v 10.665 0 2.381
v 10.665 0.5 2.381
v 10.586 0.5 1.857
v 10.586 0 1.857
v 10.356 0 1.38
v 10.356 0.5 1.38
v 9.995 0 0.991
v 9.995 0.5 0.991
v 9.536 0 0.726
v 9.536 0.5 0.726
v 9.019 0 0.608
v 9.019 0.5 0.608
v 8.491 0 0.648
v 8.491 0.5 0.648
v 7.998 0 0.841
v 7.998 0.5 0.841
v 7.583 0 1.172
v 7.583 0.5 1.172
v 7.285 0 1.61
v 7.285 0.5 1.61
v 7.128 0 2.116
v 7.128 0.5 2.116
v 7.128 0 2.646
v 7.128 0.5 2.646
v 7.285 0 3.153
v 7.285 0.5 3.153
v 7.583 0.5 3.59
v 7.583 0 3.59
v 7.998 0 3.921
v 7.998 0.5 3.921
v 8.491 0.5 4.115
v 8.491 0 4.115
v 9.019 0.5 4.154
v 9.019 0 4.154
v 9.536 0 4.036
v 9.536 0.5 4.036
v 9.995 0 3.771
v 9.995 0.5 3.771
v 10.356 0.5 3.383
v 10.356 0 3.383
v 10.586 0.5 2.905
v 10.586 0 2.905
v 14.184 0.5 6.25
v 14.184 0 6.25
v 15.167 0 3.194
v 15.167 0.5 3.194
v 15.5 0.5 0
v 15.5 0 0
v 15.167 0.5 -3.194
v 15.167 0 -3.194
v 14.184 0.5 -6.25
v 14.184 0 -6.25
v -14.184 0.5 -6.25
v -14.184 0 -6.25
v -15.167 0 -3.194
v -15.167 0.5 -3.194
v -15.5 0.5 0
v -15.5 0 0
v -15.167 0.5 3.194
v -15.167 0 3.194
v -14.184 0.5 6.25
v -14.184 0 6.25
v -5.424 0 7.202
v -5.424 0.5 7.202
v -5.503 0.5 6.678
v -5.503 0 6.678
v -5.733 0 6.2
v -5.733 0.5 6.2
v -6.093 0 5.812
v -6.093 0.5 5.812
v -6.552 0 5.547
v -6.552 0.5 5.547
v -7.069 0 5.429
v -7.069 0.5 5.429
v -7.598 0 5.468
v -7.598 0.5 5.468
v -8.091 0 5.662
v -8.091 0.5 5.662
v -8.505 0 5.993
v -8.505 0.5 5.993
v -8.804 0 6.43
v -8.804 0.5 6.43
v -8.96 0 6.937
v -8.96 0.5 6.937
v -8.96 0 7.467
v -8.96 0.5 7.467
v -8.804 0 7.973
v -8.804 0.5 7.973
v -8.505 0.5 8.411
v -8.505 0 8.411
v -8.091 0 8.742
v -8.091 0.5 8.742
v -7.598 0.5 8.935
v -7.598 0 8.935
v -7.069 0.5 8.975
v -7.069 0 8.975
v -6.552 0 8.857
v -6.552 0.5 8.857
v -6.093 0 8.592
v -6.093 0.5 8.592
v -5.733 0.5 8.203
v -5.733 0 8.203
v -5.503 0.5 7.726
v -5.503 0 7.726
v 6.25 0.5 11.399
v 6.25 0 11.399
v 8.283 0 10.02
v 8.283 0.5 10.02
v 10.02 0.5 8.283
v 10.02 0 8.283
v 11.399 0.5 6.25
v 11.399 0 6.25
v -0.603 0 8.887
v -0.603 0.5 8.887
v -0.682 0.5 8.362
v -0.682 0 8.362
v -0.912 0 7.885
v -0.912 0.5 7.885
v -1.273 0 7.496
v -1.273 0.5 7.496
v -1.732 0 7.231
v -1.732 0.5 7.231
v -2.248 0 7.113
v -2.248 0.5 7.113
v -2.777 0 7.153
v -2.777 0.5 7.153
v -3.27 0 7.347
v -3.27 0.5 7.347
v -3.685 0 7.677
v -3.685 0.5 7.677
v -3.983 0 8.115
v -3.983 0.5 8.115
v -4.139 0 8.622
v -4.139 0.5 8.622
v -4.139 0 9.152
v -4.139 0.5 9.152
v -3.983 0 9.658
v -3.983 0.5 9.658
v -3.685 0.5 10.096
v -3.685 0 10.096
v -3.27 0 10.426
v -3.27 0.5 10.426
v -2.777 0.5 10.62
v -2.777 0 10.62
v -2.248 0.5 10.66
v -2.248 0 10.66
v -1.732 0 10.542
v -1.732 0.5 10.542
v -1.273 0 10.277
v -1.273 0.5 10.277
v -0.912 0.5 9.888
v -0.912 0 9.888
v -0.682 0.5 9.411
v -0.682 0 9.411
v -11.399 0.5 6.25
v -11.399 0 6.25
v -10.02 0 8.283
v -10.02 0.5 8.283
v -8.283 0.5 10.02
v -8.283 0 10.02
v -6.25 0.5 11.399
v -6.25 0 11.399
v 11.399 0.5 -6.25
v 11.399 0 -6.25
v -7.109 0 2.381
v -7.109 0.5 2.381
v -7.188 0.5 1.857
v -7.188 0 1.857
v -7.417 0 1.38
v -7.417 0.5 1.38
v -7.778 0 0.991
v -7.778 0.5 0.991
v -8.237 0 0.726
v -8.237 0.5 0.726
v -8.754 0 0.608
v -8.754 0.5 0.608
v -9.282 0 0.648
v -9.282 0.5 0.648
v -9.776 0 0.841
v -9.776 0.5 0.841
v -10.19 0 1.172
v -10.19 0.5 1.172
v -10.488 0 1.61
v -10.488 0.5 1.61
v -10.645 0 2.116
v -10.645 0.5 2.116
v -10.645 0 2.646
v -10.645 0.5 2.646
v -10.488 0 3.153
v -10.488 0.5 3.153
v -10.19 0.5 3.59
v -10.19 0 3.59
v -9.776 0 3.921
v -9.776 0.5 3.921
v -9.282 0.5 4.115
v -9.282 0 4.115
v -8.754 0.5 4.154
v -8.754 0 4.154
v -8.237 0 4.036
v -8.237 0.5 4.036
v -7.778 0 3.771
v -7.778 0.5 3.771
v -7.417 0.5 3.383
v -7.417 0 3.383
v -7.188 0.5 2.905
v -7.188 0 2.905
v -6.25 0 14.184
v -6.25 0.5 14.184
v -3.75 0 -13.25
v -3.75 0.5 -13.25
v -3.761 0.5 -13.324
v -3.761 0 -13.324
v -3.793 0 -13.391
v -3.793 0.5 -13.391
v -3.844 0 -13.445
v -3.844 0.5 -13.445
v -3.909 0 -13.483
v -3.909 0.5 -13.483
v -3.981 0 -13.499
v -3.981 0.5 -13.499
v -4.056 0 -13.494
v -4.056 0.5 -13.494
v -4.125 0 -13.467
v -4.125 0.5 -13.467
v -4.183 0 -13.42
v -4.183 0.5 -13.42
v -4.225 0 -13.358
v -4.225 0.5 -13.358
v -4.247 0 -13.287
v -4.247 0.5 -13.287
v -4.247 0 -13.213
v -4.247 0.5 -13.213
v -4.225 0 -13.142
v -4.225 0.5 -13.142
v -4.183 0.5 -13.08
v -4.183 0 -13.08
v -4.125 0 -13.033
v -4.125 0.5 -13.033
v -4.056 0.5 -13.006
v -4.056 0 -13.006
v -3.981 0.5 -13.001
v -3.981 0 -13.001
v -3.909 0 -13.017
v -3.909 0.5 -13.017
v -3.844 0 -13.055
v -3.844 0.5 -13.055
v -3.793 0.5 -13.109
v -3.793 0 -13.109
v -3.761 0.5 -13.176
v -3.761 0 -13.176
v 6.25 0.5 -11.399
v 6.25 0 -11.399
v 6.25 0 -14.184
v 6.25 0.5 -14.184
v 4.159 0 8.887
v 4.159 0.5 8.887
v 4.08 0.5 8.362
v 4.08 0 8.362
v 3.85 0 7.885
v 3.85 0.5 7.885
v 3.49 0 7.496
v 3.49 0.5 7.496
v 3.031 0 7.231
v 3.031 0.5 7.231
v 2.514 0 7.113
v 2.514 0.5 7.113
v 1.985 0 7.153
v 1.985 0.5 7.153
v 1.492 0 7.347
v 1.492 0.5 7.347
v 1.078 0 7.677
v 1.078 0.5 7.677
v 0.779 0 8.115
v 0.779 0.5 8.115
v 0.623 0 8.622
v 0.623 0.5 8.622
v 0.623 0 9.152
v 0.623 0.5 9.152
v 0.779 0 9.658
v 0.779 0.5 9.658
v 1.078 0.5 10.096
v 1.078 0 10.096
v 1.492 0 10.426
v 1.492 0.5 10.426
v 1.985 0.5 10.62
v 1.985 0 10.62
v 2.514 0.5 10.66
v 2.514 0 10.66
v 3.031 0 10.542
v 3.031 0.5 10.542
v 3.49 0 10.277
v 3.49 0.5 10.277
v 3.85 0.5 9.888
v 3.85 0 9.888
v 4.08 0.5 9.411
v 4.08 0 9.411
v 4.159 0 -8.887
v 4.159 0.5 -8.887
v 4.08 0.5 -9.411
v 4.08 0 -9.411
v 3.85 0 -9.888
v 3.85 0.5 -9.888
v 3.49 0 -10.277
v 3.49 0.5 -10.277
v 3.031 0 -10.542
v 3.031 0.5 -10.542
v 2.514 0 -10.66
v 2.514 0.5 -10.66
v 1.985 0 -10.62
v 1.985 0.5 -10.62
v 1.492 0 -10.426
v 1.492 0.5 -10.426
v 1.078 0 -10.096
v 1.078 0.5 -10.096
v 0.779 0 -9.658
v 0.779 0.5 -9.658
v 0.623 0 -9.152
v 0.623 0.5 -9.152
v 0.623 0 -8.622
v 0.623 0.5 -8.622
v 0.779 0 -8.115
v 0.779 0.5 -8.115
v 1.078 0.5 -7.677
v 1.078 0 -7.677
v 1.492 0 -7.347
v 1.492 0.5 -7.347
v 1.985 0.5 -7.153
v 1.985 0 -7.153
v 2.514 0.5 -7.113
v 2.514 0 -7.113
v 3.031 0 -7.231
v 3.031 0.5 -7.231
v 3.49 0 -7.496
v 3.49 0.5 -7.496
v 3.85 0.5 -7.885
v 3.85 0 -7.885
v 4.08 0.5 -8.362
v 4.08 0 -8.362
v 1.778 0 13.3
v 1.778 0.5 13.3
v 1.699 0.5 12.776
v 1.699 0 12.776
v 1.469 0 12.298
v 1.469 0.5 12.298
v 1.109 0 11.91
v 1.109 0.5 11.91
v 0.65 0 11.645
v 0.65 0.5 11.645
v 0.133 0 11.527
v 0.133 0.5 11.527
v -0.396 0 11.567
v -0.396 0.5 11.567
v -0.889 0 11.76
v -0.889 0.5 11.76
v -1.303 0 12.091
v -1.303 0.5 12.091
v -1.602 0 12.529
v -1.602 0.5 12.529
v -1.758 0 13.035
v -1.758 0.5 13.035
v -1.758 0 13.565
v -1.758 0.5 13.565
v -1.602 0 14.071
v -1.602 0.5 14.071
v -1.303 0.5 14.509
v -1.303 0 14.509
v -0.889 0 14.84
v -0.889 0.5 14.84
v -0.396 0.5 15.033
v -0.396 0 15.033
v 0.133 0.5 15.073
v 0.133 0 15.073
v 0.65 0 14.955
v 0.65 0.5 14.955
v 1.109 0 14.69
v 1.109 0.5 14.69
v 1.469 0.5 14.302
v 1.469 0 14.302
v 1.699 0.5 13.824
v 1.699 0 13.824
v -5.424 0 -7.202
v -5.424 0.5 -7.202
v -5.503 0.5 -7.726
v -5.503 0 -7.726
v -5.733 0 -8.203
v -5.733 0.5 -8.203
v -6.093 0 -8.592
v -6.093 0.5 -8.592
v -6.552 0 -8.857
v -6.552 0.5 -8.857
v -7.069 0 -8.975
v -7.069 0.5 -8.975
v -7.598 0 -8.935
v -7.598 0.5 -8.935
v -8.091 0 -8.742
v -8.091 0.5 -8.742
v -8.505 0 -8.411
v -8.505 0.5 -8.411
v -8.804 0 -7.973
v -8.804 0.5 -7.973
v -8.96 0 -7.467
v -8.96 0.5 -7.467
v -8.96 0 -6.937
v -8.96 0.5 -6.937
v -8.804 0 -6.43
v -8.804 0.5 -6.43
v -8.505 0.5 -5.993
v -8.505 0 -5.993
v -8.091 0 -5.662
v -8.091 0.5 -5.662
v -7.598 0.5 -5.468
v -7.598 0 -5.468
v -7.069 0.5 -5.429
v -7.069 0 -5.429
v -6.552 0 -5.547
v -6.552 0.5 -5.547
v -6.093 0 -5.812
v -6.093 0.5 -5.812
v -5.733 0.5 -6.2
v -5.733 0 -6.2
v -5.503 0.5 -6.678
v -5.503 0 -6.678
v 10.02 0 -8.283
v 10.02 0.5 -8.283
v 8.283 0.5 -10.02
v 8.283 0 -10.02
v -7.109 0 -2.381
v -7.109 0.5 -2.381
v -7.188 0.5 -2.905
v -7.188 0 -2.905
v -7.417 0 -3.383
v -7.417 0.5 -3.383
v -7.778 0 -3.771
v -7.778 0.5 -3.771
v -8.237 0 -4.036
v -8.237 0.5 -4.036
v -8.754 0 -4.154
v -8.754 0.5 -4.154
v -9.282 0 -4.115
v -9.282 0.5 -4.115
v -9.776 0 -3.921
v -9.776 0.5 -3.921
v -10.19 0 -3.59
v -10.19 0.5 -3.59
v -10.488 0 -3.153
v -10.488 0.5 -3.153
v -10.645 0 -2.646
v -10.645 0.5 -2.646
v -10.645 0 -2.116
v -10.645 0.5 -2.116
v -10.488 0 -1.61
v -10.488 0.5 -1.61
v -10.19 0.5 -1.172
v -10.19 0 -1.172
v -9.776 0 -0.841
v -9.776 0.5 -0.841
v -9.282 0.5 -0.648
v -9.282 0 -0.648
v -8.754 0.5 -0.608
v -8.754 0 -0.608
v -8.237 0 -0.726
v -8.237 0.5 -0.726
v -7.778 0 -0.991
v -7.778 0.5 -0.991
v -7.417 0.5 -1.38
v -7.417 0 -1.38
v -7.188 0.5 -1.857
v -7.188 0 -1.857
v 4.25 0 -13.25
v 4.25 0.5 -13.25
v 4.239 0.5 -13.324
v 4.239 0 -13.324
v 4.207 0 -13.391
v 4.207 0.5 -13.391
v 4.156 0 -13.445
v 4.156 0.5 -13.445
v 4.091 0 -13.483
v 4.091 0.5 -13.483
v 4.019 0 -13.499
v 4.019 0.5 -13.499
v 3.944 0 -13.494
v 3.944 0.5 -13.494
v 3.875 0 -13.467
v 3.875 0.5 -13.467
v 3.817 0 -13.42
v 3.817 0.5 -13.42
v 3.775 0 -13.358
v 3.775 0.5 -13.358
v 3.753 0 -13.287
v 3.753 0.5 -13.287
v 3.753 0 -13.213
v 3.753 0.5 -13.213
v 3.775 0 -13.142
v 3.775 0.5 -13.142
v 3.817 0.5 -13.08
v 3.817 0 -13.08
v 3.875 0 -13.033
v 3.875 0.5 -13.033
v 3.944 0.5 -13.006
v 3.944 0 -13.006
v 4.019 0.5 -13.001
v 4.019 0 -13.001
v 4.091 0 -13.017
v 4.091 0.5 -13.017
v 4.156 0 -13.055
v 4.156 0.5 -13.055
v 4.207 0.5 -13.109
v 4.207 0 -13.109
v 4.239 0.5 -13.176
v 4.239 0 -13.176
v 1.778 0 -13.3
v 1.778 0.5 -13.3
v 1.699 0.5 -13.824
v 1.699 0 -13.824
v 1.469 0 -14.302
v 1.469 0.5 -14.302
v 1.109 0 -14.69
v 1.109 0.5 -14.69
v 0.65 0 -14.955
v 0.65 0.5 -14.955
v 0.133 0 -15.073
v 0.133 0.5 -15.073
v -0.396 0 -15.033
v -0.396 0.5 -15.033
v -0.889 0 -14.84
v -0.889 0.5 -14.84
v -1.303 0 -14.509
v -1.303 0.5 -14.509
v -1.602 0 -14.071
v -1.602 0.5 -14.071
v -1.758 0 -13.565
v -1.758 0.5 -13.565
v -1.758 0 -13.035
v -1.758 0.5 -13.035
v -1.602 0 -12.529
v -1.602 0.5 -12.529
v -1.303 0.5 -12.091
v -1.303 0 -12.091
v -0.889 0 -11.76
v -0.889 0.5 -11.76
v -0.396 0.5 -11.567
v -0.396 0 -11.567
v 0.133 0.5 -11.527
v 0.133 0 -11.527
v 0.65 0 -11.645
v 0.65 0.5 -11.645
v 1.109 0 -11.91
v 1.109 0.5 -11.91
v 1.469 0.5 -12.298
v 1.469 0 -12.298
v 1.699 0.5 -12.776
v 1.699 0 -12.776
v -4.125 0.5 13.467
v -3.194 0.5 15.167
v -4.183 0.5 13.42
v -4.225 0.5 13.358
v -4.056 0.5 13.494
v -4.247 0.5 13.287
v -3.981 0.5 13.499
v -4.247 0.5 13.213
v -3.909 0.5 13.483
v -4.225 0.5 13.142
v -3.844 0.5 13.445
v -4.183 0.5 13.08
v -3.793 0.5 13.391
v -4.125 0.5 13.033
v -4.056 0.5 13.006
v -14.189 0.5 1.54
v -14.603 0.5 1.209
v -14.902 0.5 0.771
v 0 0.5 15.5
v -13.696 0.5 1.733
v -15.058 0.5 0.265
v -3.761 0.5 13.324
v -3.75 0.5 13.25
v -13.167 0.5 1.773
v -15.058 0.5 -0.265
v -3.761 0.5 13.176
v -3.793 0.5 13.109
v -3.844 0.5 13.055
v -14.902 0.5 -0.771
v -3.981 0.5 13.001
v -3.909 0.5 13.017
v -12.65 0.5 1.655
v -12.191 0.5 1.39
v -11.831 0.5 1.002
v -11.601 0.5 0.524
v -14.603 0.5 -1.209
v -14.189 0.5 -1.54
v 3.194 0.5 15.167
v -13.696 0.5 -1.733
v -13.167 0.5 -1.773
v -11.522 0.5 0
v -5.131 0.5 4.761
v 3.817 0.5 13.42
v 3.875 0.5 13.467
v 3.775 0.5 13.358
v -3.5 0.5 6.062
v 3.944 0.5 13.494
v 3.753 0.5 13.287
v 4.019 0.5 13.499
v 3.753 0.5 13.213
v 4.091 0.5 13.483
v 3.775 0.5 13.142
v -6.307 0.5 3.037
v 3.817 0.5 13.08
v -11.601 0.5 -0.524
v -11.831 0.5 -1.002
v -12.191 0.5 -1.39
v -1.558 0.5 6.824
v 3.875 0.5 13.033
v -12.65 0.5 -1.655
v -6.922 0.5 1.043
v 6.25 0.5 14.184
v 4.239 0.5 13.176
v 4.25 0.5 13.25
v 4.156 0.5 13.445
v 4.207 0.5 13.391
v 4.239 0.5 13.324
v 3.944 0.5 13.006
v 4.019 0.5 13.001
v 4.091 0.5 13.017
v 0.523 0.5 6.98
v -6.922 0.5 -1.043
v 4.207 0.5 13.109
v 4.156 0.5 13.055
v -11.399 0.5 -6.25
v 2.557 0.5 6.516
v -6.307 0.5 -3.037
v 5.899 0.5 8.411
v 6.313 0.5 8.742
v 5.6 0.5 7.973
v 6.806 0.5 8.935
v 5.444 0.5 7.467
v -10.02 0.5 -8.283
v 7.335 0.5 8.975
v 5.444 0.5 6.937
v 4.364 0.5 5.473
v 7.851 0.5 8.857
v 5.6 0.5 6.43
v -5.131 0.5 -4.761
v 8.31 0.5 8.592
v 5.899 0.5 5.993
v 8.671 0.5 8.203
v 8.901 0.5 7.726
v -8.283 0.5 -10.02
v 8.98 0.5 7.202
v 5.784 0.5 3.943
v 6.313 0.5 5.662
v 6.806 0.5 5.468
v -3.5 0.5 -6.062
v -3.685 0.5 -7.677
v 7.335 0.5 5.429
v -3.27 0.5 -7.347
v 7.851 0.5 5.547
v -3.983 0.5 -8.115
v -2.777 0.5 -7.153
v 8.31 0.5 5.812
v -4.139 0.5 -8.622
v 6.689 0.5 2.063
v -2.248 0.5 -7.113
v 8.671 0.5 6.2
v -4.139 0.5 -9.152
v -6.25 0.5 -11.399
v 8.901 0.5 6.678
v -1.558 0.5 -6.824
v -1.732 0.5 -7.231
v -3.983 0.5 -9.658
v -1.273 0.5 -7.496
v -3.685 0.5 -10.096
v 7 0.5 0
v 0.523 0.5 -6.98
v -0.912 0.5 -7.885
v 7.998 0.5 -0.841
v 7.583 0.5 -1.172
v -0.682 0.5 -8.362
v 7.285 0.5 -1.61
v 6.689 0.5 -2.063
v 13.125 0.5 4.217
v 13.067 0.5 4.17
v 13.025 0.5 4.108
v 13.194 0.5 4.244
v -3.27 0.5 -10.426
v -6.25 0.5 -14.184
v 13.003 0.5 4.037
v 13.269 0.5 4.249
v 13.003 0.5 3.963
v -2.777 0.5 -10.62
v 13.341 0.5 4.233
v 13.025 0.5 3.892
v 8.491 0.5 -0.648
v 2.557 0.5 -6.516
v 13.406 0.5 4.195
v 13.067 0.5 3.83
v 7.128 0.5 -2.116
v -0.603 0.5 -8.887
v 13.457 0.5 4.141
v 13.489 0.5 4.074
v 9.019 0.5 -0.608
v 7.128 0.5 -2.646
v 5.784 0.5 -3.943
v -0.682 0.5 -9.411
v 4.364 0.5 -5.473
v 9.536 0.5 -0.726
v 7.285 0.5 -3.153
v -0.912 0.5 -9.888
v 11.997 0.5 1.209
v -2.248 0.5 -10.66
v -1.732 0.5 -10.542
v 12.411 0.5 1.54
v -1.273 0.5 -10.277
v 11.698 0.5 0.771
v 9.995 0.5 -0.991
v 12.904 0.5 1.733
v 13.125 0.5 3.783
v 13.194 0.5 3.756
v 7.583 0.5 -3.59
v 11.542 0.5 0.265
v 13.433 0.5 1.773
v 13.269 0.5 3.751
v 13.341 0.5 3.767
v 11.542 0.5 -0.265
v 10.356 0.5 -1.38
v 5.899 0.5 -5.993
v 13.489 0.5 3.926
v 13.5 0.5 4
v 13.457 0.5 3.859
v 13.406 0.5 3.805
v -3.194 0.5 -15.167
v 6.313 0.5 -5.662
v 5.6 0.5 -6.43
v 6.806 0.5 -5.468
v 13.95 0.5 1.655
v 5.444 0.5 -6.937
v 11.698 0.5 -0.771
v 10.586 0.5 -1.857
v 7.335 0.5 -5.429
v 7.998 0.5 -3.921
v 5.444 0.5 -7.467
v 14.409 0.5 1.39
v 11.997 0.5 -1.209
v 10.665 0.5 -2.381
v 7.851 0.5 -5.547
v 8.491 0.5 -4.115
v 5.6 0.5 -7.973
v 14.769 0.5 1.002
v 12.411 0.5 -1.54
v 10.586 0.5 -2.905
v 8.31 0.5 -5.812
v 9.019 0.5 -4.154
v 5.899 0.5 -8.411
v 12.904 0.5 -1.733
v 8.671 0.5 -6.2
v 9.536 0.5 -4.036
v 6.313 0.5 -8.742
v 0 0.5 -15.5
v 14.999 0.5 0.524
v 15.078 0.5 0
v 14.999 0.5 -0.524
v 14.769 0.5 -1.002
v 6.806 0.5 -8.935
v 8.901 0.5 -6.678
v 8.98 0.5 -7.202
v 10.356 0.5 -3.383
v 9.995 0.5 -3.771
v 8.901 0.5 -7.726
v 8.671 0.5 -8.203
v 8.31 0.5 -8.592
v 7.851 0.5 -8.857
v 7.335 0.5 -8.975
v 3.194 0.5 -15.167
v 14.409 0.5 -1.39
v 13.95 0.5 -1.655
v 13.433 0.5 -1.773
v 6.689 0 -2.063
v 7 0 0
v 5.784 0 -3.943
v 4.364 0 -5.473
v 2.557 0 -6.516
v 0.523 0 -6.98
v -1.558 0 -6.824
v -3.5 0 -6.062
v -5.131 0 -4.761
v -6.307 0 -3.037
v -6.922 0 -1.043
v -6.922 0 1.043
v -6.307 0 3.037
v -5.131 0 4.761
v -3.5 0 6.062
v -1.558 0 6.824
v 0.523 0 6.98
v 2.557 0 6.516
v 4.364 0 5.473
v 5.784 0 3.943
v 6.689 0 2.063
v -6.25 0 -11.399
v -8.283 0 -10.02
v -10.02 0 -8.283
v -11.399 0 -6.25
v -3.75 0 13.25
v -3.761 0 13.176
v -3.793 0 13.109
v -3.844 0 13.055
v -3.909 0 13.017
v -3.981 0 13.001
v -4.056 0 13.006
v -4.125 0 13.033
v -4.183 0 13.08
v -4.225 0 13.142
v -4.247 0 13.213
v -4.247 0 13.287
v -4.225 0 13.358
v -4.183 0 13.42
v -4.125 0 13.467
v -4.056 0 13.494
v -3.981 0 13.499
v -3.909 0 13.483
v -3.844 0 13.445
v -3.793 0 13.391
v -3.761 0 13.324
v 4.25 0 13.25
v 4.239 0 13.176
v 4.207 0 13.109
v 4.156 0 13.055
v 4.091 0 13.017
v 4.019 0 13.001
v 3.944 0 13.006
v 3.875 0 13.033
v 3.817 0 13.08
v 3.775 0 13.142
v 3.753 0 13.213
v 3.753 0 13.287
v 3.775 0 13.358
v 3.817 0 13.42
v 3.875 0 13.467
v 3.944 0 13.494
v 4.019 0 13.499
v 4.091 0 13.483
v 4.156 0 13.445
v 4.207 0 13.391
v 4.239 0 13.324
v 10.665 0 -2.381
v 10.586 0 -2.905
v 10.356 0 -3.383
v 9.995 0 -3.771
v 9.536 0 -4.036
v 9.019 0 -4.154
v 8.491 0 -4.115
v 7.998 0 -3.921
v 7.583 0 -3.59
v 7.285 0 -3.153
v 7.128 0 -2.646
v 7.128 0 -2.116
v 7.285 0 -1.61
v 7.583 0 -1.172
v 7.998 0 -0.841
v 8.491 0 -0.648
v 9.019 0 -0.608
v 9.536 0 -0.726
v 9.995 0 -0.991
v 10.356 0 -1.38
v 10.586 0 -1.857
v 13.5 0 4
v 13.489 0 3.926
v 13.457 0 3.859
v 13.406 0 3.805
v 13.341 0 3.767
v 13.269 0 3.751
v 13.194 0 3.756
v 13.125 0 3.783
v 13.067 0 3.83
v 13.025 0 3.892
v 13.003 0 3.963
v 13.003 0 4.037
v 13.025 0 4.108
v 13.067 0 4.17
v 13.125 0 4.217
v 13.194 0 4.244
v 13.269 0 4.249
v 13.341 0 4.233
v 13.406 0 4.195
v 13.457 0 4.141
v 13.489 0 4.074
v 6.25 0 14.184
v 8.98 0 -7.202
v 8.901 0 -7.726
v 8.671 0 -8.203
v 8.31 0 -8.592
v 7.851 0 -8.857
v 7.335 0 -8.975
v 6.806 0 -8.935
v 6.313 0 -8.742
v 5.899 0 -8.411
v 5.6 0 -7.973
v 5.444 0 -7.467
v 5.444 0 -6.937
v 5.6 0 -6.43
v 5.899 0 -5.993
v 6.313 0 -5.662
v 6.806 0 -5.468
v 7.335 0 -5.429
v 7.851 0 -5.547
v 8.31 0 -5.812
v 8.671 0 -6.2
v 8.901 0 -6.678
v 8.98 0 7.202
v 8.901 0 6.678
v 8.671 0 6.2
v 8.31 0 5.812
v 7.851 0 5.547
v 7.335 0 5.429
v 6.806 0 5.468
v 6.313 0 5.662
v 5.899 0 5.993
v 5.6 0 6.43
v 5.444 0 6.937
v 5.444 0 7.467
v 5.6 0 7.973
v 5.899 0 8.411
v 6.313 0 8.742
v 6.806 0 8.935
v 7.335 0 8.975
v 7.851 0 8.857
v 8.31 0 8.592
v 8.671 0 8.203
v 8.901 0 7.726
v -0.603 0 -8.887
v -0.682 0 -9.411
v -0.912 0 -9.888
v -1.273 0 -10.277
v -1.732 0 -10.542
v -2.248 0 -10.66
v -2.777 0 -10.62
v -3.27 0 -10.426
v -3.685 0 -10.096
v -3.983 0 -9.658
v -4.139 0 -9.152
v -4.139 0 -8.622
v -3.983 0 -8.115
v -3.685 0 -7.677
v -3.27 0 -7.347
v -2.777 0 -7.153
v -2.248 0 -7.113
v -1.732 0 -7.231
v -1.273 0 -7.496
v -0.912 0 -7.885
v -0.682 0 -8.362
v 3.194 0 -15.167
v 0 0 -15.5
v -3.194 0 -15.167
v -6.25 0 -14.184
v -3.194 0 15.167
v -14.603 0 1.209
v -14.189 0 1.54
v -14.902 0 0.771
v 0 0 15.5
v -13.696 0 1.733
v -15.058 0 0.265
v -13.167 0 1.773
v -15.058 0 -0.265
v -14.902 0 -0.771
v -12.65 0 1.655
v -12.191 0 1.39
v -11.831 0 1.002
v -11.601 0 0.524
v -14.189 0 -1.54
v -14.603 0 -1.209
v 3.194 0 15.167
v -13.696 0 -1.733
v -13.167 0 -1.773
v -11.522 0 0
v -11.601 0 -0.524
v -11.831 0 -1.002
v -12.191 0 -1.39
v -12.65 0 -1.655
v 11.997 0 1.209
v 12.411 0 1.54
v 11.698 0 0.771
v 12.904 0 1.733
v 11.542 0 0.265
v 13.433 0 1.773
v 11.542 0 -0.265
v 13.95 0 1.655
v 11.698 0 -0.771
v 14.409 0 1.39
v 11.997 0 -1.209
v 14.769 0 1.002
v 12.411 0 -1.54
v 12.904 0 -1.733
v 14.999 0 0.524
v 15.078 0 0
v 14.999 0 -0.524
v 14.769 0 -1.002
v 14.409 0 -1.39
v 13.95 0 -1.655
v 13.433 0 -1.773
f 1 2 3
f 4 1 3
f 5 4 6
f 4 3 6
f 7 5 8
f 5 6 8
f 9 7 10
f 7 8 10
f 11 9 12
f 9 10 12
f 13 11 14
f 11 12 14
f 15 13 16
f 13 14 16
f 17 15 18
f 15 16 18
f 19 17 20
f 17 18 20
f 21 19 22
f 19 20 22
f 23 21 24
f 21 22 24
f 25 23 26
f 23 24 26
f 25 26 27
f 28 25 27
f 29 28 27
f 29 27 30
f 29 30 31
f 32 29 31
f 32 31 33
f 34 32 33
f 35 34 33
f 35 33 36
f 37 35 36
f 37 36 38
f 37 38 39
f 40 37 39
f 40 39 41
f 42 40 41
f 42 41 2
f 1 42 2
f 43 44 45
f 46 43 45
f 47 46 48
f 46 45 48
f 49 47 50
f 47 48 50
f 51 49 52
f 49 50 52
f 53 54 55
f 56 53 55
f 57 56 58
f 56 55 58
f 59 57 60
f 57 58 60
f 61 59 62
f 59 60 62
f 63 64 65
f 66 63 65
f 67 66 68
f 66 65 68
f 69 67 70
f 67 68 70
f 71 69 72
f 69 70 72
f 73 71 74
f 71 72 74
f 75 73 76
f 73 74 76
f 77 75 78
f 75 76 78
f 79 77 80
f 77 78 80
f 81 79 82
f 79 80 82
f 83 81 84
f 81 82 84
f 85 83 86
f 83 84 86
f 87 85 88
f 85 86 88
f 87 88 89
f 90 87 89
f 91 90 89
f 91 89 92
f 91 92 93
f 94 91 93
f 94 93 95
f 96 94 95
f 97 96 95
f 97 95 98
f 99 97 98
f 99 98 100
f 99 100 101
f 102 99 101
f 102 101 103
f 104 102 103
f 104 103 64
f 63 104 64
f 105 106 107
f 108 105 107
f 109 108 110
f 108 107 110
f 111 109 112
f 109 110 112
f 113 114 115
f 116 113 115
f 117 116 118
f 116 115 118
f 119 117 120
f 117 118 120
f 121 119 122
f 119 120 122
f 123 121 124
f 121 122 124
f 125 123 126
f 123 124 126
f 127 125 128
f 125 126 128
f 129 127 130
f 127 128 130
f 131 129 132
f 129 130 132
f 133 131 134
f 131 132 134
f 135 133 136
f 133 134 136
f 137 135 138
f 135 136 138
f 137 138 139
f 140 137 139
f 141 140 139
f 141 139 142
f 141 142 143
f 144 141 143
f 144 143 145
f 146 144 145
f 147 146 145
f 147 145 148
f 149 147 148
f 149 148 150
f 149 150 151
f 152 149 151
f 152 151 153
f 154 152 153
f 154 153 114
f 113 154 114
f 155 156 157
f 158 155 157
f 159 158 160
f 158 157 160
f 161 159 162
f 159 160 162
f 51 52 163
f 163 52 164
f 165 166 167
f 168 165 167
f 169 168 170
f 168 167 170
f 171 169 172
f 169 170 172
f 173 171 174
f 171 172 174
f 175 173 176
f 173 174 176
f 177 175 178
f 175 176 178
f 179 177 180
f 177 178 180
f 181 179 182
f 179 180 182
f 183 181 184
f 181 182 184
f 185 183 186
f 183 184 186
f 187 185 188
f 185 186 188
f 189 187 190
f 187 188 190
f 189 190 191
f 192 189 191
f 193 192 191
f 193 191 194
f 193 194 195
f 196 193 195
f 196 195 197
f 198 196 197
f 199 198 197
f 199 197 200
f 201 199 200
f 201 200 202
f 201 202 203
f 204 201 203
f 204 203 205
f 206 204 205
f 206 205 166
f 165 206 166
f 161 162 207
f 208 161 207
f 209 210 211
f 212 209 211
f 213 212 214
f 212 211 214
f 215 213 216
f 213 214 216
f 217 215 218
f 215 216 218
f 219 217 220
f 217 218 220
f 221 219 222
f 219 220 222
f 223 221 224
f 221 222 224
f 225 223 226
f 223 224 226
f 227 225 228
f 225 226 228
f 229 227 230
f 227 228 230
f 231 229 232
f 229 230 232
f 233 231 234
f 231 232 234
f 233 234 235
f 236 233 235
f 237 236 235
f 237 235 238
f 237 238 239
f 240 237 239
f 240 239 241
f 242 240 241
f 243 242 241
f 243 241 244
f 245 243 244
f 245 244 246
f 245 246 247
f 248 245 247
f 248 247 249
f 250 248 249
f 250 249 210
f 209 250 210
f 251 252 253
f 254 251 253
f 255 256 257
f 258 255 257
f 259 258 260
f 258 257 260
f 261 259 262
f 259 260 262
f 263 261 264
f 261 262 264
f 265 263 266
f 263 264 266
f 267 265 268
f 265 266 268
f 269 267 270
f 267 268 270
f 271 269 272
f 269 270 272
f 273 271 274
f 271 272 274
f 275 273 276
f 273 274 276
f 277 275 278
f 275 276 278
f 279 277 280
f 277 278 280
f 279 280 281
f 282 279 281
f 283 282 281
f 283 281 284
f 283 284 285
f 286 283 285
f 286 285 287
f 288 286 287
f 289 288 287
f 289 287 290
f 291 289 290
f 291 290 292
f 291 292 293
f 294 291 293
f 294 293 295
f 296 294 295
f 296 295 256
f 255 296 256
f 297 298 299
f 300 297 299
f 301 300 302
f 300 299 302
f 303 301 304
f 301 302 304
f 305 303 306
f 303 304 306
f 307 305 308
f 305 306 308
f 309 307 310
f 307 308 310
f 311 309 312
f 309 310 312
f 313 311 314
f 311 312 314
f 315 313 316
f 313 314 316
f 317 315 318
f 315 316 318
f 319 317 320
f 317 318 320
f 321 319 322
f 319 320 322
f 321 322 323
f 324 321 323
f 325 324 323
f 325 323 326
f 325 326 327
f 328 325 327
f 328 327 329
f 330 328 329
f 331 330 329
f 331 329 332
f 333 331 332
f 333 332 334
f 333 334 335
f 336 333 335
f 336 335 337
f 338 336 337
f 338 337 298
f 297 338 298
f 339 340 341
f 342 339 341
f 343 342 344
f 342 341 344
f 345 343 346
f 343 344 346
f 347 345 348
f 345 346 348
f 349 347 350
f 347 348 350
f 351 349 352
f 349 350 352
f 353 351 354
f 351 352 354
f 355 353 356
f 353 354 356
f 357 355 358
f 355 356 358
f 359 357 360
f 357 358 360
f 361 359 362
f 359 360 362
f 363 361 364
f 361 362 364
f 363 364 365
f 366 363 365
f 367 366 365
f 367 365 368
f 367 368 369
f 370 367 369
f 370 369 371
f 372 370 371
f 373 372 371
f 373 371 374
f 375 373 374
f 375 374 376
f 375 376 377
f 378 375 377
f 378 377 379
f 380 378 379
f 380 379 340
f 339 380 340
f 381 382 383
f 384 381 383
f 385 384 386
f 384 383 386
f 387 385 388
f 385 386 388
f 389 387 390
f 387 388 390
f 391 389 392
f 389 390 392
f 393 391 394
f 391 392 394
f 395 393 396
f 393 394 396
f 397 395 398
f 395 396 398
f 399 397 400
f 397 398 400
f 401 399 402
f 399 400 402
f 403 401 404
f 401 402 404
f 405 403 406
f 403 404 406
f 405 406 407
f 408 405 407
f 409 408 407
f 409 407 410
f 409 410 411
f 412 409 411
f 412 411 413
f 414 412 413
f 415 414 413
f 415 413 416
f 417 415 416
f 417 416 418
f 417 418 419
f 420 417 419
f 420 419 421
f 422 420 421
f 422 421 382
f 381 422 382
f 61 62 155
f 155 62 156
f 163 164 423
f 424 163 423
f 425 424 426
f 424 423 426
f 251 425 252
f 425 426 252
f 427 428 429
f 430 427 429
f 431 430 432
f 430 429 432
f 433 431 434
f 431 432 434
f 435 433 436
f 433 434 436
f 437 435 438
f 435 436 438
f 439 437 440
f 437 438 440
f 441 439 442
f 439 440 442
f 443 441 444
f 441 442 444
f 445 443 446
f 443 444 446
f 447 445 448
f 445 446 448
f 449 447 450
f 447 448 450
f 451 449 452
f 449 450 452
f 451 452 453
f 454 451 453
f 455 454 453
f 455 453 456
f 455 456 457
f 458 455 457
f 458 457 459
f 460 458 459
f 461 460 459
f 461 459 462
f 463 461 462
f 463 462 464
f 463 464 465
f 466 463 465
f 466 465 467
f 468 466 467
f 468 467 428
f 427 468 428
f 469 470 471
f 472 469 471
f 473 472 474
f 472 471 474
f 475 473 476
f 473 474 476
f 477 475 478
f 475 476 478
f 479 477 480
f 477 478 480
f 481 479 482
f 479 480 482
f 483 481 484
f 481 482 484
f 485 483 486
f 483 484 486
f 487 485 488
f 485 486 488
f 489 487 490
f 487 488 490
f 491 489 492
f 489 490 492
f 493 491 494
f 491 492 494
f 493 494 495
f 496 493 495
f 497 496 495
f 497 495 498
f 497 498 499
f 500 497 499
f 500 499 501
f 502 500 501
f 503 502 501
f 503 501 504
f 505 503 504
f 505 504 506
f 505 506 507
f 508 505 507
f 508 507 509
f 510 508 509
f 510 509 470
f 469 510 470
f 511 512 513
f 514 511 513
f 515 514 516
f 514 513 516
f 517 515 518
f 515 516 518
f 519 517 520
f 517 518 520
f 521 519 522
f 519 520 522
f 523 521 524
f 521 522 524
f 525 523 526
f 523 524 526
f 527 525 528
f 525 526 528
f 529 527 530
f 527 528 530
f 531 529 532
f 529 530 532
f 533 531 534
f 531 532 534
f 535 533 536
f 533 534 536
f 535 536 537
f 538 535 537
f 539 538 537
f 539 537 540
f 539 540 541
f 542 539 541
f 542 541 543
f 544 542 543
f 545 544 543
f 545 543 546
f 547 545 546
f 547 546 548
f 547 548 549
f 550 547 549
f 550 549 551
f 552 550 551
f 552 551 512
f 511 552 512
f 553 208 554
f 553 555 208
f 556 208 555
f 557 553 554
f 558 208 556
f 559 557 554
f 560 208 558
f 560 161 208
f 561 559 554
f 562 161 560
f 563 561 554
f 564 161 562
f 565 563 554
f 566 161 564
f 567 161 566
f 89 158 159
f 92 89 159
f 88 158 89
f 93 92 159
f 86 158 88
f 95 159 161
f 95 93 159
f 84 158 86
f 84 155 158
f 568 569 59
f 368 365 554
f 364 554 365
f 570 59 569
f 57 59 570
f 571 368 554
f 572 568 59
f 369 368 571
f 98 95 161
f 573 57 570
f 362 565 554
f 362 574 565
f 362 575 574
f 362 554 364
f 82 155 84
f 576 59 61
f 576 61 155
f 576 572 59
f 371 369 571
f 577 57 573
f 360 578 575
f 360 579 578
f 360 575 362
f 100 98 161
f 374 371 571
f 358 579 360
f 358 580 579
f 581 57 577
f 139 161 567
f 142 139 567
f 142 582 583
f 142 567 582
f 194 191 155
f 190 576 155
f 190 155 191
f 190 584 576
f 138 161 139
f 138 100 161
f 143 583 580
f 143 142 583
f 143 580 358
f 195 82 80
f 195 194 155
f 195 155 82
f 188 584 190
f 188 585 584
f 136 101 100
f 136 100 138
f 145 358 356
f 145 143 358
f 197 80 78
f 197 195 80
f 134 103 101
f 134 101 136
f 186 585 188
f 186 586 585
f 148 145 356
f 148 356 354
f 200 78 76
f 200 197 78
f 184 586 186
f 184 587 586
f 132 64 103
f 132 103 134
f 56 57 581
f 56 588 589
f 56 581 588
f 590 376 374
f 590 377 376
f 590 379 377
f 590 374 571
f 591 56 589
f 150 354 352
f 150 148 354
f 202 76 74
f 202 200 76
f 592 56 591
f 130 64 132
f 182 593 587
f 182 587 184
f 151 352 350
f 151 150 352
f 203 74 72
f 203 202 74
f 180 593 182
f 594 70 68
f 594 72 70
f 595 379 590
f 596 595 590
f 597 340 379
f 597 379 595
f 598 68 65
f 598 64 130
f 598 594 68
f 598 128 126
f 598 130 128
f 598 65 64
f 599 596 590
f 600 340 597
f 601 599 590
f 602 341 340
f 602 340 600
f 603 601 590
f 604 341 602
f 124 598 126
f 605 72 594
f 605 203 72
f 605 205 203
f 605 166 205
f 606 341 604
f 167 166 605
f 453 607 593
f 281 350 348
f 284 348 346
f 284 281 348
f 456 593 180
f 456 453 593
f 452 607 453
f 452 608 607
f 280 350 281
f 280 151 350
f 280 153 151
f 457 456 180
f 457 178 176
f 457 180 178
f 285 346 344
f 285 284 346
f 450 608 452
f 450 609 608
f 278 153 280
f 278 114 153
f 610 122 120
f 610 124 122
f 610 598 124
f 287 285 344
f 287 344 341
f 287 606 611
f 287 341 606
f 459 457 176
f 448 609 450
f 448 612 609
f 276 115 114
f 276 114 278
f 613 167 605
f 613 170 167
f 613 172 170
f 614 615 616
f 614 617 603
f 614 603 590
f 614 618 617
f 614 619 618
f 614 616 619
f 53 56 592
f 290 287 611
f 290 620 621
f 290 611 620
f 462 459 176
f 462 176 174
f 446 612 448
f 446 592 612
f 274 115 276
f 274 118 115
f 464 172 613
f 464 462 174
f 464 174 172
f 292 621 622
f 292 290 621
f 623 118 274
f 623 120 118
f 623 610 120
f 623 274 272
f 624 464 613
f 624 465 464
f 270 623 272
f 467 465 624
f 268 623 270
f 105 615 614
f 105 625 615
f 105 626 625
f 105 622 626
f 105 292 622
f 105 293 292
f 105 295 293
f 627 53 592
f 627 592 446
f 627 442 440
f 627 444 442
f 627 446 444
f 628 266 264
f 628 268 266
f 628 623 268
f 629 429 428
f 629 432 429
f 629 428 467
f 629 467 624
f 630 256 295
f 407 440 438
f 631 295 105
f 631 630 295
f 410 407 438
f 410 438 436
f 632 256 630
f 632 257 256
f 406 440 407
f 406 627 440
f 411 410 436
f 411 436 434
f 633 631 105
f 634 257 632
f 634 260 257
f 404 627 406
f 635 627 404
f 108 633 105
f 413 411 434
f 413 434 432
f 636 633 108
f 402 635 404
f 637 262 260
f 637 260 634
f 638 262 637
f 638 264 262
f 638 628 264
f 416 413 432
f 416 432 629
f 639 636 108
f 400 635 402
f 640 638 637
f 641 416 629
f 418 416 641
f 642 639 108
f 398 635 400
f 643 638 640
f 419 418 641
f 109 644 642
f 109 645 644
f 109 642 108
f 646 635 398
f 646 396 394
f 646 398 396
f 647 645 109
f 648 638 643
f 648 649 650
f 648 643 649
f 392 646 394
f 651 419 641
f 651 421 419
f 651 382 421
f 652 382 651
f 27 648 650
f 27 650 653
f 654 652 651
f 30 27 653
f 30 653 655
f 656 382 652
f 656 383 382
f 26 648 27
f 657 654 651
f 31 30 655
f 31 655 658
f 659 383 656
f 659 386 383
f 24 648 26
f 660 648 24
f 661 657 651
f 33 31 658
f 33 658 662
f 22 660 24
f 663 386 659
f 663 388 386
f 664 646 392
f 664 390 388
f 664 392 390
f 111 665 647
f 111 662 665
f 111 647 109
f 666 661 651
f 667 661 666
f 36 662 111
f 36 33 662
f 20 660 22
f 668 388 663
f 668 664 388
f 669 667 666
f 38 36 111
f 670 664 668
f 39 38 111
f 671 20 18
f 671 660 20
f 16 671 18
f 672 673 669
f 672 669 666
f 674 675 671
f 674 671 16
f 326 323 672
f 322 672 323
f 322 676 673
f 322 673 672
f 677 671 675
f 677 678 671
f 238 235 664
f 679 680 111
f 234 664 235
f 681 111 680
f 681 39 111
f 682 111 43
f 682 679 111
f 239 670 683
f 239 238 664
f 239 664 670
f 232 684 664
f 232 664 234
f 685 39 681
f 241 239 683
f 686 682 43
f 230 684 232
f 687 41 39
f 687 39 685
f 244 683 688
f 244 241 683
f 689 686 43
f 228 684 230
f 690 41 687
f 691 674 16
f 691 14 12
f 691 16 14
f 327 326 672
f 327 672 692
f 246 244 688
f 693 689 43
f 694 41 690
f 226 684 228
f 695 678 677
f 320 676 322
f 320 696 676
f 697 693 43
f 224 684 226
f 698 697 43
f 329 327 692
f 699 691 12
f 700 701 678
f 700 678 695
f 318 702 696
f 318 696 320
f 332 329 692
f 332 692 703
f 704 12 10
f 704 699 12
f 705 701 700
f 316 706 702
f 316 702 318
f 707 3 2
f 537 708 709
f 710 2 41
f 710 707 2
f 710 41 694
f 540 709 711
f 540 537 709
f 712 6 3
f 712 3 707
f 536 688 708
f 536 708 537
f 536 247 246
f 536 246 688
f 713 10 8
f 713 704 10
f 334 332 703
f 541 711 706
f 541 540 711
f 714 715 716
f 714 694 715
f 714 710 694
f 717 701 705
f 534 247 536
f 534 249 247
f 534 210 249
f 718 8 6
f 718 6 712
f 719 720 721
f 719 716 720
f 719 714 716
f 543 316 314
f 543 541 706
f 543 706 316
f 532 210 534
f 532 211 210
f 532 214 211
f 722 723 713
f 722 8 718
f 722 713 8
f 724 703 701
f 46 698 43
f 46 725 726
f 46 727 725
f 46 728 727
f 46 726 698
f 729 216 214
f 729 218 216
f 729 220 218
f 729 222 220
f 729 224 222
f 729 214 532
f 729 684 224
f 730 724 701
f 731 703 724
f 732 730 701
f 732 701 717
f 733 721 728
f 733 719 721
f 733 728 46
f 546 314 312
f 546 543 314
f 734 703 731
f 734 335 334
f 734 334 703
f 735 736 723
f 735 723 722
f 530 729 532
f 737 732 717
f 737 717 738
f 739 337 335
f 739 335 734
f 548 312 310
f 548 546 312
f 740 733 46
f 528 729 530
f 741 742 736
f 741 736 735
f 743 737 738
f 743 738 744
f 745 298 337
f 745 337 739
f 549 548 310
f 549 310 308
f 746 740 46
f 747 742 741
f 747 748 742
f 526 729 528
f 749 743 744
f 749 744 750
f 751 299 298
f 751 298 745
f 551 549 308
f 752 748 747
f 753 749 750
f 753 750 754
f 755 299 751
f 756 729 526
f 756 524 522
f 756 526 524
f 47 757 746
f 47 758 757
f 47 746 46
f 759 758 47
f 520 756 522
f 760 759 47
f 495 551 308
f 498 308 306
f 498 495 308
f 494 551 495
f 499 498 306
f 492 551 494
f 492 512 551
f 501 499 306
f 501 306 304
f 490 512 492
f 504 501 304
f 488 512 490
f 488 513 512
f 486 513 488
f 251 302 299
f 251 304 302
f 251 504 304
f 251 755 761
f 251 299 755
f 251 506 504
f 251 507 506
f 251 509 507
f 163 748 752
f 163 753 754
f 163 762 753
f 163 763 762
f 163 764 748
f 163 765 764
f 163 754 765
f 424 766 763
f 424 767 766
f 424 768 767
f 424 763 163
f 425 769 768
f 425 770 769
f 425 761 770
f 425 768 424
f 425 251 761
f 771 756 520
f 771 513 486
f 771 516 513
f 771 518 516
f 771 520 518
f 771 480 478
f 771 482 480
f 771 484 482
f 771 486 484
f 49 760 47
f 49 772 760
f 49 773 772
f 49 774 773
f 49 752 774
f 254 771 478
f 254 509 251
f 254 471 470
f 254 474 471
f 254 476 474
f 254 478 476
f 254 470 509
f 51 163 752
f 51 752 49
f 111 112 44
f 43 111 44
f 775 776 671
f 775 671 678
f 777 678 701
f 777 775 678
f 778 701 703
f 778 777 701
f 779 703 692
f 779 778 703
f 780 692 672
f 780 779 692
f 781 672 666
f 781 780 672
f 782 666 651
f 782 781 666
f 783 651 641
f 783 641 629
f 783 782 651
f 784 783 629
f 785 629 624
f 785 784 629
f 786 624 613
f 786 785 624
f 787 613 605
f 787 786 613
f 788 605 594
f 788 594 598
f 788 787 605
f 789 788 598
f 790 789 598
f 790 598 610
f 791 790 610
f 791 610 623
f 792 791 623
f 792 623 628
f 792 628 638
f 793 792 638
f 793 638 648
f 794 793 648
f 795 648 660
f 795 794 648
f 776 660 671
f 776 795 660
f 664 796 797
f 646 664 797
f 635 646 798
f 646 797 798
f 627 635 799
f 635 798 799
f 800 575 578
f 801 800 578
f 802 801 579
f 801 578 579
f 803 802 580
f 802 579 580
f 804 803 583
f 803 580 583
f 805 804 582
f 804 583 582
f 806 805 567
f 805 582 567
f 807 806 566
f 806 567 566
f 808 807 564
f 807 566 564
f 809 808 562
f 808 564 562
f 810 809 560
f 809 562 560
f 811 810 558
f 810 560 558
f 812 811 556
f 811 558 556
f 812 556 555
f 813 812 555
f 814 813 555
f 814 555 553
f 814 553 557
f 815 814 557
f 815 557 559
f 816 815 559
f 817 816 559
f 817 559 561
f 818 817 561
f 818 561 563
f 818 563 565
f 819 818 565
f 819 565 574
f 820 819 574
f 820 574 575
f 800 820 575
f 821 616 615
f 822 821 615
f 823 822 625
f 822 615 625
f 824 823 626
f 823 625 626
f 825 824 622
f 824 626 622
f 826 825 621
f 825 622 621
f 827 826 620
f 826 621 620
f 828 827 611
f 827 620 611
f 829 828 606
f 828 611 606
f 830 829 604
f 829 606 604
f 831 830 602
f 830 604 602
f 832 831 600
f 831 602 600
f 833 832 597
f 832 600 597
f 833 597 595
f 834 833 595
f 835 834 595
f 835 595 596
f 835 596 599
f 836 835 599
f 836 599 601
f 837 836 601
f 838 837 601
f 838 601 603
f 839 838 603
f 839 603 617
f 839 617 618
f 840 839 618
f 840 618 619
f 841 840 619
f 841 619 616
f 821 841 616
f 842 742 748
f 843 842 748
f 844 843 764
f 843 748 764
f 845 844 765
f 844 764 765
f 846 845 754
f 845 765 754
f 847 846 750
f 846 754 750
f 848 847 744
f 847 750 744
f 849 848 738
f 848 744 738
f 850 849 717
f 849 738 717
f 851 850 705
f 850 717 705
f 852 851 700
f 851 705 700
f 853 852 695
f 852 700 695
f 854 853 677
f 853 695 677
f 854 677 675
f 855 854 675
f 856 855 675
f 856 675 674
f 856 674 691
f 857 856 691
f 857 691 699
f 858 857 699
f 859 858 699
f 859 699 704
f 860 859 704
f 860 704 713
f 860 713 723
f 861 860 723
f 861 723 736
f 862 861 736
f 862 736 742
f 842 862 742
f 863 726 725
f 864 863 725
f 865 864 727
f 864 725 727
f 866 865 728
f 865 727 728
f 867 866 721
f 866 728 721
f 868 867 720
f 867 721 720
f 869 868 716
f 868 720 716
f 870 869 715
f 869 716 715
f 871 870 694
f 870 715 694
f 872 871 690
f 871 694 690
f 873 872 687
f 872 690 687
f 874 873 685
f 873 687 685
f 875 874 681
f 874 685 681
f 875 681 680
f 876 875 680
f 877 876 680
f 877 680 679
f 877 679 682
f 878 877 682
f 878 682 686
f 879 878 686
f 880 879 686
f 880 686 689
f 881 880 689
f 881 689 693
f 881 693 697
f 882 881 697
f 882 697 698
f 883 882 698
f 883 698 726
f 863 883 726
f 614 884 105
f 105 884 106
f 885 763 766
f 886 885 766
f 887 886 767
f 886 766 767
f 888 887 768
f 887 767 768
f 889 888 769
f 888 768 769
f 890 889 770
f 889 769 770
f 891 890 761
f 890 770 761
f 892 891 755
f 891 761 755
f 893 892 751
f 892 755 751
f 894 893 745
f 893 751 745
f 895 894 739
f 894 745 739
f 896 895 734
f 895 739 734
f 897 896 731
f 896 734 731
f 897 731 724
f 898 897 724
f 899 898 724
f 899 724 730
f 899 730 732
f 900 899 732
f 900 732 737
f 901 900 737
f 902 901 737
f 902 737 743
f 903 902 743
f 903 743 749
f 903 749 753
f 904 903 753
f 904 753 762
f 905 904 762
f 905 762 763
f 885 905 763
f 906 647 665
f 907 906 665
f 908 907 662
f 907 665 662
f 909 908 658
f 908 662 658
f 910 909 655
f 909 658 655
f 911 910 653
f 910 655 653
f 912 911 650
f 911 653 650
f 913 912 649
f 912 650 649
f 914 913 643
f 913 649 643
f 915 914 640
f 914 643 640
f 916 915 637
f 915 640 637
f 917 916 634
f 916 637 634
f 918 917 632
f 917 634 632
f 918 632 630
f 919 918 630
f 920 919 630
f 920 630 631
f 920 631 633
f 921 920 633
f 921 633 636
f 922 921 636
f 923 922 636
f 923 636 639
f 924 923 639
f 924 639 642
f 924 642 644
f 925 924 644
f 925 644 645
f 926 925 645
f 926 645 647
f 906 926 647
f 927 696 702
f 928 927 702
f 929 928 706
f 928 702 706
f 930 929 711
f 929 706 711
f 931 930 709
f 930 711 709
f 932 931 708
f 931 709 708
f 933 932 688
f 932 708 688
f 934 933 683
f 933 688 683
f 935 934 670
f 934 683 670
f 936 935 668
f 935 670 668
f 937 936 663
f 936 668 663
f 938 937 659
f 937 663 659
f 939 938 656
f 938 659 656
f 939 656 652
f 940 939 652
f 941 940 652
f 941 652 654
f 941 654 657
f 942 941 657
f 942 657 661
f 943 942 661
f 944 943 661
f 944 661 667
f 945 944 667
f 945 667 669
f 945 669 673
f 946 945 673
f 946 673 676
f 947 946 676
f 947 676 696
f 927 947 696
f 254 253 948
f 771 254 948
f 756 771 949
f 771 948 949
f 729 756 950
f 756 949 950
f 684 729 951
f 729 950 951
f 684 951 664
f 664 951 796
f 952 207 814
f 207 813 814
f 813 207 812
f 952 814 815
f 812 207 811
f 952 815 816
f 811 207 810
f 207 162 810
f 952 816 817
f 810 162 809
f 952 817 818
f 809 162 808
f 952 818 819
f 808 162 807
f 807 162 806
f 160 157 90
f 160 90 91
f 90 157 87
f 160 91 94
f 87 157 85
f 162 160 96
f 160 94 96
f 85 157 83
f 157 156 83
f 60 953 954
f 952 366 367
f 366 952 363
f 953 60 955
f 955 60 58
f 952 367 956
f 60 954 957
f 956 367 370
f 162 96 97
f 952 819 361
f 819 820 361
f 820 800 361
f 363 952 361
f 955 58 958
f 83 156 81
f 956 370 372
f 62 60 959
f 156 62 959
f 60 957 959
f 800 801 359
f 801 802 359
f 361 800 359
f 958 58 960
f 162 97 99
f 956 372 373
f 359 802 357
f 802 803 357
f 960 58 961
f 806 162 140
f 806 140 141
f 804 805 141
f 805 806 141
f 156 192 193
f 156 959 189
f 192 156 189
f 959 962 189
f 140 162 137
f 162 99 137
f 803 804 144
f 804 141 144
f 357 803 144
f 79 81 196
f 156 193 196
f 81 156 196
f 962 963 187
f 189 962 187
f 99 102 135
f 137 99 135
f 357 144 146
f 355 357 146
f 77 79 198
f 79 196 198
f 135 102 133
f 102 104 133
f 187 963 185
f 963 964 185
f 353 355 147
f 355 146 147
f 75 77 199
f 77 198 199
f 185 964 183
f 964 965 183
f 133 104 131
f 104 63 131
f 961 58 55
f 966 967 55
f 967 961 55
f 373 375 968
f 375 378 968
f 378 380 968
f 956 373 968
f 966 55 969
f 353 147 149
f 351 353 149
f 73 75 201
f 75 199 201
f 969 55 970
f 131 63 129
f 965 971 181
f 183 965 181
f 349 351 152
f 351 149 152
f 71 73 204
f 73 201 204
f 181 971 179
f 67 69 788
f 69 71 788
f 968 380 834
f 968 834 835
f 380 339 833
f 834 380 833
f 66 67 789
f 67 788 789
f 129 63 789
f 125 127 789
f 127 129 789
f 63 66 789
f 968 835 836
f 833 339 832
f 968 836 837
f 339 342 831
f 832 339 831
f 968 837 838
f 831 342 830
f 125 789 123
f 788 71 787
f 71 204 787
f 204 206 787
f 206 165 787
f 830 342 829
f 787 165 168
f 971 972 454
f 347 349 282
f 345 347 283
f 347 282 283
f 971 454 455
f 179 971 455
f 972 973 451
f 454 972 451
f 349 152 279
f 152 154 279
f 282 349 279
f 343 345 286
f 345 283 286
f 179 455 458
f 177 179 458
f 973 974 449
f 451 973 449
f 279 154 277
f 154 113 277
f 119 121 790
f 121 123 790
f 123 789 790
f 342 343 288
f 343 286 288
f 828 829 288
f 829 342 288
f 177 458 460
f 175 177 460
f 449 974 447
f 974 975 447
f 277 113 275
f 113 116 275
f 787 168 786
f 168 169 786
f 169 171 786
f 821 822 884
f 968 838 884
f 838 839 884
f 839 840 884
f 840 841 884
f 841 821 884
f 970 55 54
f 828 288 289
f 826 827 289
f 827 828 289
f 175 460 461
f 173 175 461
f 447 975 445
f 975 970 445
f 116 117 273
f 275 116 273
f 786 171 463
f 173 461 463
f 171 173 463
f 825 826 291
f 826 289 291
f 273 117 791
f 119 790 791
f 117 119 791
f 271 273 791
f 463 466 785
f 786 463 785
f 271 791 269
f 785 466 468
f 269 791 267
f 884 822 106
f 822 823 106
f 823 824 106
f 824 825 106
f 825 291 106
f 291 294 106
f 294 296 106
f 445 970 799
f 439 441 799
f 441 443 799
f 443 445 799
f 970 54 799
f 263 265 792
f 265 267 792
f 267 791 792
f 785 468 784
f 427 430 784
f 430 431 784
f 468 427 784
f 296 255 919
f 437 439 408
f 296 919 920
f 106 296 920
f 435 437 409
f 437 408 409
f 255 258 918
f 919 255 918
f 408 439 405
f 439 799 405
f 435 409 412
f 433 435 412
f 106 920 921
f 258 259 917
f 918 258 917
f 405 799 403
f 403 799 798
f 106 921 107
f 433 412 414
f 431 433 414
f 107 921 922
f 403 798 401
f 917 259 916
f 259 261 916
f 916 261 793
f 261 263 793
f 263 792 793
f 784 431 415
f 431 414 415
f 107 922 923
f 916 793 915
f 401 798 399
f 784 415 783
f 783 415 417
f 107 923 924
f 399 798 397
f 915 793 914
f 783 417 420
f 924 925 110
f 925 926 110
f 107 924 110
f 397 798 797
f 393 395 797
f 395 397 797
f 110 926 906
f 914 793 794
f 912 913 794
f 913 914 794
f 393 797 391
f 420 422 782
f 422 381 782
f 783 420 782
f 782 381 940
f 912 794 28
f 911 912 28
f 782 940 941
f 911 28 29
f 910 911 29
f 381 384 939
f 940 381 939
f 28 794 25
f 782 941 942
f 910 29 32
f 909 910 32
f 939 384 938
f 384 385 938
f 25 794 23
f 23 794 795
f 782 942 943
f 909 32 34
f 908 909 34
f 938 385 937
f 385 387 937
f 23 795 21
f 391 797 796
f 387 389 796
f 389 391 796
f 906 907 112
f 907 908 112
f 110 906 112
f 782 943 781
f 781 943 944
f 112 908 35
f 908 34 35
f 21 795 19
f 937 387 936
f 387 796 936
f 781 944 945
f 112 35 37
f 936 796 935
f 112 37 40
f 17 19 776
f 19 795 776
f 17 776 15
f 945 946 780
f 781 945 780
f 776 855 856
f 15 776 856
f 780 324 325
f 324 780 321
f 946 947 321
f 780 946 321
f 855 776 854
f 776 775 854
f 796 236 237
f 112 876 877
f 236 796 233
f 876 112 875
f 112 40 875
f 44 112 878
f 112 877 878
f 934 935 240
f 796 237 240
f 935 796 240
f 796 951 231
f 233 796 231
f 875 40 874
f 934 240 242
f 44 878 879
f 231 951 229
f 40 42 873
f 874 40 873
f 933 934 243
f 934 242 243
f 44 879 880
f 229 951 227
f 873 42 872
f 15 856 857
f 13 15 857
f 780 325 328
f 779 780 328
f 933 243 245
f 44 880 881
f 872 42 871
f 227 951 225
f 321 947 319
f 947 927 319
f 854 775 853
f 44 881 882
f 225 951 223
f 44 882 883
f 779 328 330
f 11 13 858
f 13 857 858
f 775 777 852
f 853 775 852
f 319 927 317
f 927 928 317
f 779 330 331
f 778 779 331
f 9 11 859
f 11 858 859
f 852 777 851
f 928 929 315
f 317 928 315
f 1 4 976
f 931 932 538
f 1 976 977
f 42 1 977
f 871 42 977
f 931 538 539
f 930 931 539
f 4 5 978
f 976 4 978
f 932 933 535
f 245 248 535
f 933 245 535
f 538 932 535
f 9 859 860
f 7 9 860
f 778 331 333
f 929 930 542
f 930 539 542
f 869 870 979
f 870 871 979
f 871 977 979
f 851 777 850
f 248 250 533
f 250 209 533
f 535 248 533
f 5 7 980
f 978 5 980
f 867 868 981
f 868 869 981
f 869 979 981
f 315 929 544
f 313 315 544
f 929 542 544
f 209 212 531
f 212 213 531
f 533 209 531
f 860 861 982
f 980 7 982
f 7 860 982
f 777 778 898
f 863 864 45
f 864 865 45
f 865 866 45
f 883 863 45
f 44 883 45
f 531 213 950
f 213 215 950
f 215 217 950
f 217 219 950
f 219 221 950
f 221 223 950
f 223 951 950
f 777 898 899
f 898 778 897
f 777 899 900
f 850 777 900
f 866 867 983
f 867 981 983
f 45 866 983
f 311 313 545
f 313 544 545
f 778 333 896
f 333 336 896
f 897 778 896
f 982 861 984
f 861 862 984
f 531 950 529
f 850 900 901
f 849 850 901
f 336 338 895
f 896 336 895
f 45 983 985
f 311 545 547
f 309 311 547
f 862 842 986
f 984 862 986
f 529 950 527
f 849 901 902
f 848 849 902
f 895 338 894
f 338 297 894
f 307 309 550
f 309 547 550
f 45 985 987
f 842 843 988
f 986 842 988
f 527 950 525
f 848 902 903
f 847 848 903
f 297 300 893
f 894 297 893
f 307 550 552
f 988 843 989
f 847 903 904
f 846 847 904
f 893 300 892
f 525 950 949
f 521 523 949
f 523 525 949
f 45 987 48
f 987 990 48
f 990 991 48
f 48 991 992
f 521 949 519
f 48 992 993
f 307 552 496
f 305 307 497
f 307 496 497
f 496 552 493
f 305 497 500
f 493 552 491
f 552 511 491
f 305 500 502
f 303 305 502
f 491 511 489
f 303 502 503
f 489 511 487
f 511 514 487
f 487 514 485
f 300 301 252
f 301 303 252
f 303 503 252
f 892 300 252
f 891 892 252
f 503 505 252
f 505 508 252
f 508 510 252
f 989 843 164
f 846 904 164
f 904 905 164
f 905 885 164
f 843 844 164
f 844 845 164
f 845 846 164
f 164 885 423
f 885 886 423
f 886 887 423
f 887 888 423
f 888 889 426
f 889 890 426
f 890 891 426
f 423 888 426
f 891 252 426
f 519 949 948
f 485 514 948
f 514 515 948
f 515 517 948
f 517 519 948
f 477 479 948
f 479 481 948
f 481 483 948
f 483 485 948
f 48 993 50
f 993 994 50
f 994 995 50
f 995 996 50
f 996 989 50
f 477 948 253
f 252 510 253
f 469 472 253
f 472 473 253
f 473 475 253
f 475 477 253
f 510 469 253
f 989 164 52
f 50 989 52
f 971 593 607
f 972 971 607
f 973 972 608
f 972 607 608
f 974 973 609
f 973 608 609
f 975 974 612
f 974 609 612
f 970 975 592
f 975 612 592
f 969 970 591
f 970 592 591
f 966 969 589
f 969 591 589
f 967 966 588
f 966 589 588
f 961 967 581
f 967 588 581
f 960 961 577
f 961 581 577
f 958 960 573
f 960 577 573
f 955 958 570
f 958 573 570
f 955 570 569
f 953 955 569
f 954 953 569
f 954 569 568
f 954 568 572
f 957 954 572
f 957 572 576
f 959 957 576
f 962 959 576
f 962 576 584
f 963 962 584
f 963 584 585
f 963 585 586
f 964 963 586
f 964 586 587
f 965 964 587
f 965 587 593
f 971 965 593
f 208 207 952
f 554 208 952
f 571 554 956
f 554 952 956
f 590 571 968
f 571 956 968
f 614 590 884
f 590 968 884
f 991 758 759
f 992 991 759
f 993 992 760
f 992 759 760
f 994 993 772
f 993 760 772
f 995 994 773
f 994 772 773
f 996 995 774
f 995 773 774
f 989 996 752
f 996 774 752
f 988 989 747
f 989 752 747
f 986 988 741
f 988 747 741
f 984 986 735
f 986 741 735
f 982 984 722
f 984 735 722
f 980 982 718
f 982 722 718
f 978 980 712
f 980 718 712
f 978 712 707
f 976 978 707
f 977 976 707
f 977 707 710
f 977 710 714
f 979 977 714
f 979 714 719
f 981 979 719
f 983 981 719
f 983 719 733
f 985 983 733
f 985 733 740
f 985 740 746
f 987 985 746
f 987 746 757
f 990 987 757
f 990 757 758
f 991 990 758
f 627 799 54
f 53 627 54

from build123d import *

# Parameters (mm, degrees)
SKETCH1_R           = 7
BOSS_EXTRUDE1_DEPTH = 0.5
SKETCH2_R           = 1.778
CUT_EXTRUDE2_DEPTH  = 1.5
SKETCH4_R           = 0.25
CUT_EXTRUDE3_DEPTH  = 1.5


with BuildPart() as part:
    # Sketch1 → Boss-Extrude1 (new body)
    with BuildSketch(Plane(origin=(0, 0, 0), x_dir=(1, 0, 0), z_dir=(0, 1, 0))):
        with BuildLine():
            Line((-6.25, 14.184057953), (-6.25, 11.399013115))
            ThreePointArc((-6.25, 11.399013115), (-9.192388155, 9.192388155), (-11.399013115, 6.25))
            Line((-11.399013115, 6.25), (-14.184057953, 6.25))
            ThreePointArc((-14.184057953, 6.25), (-15.5, 0), (-14.184057953, -6.25))
            Line((-14.184057953, -6.25), (-11.399013115, -6.25))
            ThreePointArc((-11.399013115, -6.25), (-9.192388155, -9.192388155), (-6.25, -11.399013115))
            Line((-6.25, -11.399013115), (-6.25, -14.184057953))
            ThreePointArc((-6.25, -14.184057953), (0, -15.5), (6.25, -14.184057953))
            Line((6.25, -14.184057953), (6.25, -11.399013115))
            ThreePointArc((6.25, -11.399013115), (9.192388155, -9.192388155), (11.399013115, -6.25))
            Line((11.399013115, -6.25), (14.184057953, -6.25))
            ThreePointArc((14.184057953, -6.25), (15.5, 0), (14.184057953, 6.25))
            Line((14.184057953, 6.25), (11.399013115, 6.25))
            ThreePointArc((11.399013115, 6.25), (9.192388155, 9.192388155), (6.25, 11.399013115))
            Line((6.25, 11.399013115), (6.25, 14.184057953))
            ThreePointArc((6.25, 14.184057953), (0, 15.5), (-6.25, 14.184057953))
        make_face()
        Circle(SKETCH1_R, mode=Mode.SUBTRACT)
    extrude(amount=BOSS_EXTRUDE1_DEPTH)

    # Sketch2 → Cut-Extrude2 (cut, through all)
    with BuildSketch(Plane(origin=(0, 0.5, 0), x_dir=(1, 0, 0), z_dir=(0, 1, 0))):
        with Locations((0, 13.3)):
            Circle(SKETCH2_R)
        with Locations((-2.381135215, 8.886517602)):
            Circle(SKETCH2_R)
        with Locations((-13.3, 0)):
            Circle(SKETCH2_R)
        with Locations((-8.886517602, 2.381135215)):
            Circle(SKETCH2_R)
        with Locations((-7.201882566, 7.201882566)):
            Circle(SKETCH2_R)
        with Locations((0, -13.3)):
            Circle(SKETCH2_R)
        with Locations((-2.381135215, -8.886517602)):
            Circle(SKETCH2_R)
        with Locations((-7.201882566, -7.201882566)):
            Circle(SKETCH2_R)
        with Locations((-8.886517602, -2.381135215)):
            Circle(SKETCH2_R)
        with Locations((2.381135215, 8.886517602)):
            Circle(SKETCH2_R)
        with Locations((7.201882566, 7.201882566)):
            Circle(SKETCH2_R)
        with Locations((8.886517602, 2.381135215)):
            Circle(SKETCH2_R)
        with Locations((13.3, 0)):
            Circle(SKETCH2_R)
        with Locations((8.886517602, -2.381135215)):
            Circle(SKETCH2_R)
        with Locations((7.201882566, -7.201882566)):
            Circle(SKETCH2_R)
        with Locations((2.381135215, -8.886517602)):
            Circle(SKETCH2_R)
    extrude(amount=-CUT_EXTRUDE2_DEPTH, mode=Mode.SUBTRACT)

    # Sketch4 → Cut-Extrude3 (cut, through all)
    with BuildSketch(Plane(origin=(0, 0.5, 0), x_dir=(1, 0, 0), z_dir=(0, 1, 0))):
        with Locations((-4, 13.25)):
            Circle(SKETCH4_R)
        with Locations((13.25, -4)):
            Circle(SKETCH4_R)
        with Locations((4, -13.25)):
            Circle(SKETCH4_R)
        with Locations((-4, -13.25)):
            Circle(SKETCH4_R)
        with Locations((4, 13.25)):
            Circle(SKETCH4_R)
    extrude(amount=-CUT_EXTRUDE3_DEPTH, mode=Mode.SUBTRACT)


solid = part.part
